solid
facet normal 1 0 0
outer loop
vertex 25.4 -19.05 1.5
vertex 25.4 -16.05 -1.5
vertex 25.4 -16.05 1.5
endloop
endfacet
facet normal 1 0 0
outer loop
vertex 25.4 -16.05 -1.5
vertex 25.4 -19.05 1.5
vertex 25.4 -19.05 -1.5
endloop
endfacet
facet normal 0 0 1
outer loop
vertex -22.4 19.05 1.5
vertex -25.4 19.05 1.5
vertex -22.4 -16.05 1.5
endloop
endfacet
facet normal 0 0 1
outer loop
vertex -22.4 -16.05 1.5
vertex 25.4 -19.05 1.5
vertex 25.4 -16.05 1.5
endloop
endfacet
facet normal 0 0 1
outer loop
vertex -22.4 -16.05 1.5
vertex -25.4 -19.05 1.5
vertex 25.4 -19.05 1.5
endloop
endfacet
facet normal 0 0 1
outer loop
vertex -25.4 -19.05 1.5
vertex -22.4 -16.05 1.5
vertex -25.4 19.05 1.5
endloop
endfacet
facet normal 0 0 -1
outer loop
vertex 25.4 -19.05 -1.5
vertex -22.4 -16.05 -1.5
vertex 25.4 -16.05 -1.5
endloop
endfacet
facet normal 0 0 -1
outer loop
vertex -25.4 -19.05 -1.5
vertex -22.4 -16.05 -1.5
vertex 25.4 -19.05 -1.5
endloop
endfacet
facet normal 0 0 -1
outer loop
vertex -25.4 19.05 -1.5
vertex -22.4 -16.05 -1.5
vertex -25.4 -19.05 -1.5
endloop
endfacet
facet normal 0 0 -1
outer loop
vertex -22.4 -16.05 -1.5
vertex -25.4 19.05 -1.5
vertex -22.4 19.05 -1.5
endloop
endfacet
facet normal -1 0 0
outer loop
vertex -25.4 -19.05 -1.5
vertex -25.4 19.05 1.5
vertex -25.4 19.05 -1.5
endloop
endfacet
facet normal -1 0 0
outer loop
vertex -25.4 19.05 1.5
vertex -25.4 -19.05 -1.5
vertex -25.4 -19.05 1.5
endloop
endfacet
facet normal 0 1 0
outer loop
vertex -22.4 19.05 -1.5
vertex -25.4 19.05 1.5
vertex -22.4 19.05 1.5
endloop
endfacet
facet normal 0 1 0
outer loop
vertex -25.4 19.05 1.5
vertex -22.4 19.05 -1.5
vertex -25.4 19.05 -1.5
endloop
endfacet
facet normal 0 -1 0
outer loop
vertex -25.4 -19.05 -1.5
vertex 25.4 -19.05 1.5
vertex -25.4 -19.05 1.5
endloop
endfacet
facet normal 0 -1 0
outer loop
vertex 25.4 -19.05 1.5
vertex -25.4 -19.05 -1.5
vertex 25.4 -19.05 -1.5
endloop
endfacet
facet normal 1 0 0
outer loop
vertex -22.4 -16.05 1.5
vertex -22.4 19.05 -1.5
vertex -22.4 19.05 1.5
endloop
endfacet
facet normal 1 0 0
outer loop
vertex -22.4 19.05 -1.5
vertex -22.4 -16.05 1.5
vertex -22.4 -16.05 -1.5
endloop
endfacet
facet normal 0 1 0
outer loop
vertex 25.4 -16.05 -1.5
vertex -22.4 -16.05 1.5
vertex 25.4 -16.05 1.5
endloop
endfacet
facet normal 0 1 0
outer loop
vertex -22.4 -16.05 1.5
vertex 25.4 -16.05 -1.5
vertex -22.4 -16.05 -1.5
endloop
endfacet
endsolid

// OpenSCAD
module box_section() {
    difference() {
        cube([50.8, 38.1, 3.0], center=true);
        translate([1.5, 1.5, 0])
            cube([50.8 - 3.0, 38.1 - 3.0, 3.0], center=true);
    }
}

box_section();
